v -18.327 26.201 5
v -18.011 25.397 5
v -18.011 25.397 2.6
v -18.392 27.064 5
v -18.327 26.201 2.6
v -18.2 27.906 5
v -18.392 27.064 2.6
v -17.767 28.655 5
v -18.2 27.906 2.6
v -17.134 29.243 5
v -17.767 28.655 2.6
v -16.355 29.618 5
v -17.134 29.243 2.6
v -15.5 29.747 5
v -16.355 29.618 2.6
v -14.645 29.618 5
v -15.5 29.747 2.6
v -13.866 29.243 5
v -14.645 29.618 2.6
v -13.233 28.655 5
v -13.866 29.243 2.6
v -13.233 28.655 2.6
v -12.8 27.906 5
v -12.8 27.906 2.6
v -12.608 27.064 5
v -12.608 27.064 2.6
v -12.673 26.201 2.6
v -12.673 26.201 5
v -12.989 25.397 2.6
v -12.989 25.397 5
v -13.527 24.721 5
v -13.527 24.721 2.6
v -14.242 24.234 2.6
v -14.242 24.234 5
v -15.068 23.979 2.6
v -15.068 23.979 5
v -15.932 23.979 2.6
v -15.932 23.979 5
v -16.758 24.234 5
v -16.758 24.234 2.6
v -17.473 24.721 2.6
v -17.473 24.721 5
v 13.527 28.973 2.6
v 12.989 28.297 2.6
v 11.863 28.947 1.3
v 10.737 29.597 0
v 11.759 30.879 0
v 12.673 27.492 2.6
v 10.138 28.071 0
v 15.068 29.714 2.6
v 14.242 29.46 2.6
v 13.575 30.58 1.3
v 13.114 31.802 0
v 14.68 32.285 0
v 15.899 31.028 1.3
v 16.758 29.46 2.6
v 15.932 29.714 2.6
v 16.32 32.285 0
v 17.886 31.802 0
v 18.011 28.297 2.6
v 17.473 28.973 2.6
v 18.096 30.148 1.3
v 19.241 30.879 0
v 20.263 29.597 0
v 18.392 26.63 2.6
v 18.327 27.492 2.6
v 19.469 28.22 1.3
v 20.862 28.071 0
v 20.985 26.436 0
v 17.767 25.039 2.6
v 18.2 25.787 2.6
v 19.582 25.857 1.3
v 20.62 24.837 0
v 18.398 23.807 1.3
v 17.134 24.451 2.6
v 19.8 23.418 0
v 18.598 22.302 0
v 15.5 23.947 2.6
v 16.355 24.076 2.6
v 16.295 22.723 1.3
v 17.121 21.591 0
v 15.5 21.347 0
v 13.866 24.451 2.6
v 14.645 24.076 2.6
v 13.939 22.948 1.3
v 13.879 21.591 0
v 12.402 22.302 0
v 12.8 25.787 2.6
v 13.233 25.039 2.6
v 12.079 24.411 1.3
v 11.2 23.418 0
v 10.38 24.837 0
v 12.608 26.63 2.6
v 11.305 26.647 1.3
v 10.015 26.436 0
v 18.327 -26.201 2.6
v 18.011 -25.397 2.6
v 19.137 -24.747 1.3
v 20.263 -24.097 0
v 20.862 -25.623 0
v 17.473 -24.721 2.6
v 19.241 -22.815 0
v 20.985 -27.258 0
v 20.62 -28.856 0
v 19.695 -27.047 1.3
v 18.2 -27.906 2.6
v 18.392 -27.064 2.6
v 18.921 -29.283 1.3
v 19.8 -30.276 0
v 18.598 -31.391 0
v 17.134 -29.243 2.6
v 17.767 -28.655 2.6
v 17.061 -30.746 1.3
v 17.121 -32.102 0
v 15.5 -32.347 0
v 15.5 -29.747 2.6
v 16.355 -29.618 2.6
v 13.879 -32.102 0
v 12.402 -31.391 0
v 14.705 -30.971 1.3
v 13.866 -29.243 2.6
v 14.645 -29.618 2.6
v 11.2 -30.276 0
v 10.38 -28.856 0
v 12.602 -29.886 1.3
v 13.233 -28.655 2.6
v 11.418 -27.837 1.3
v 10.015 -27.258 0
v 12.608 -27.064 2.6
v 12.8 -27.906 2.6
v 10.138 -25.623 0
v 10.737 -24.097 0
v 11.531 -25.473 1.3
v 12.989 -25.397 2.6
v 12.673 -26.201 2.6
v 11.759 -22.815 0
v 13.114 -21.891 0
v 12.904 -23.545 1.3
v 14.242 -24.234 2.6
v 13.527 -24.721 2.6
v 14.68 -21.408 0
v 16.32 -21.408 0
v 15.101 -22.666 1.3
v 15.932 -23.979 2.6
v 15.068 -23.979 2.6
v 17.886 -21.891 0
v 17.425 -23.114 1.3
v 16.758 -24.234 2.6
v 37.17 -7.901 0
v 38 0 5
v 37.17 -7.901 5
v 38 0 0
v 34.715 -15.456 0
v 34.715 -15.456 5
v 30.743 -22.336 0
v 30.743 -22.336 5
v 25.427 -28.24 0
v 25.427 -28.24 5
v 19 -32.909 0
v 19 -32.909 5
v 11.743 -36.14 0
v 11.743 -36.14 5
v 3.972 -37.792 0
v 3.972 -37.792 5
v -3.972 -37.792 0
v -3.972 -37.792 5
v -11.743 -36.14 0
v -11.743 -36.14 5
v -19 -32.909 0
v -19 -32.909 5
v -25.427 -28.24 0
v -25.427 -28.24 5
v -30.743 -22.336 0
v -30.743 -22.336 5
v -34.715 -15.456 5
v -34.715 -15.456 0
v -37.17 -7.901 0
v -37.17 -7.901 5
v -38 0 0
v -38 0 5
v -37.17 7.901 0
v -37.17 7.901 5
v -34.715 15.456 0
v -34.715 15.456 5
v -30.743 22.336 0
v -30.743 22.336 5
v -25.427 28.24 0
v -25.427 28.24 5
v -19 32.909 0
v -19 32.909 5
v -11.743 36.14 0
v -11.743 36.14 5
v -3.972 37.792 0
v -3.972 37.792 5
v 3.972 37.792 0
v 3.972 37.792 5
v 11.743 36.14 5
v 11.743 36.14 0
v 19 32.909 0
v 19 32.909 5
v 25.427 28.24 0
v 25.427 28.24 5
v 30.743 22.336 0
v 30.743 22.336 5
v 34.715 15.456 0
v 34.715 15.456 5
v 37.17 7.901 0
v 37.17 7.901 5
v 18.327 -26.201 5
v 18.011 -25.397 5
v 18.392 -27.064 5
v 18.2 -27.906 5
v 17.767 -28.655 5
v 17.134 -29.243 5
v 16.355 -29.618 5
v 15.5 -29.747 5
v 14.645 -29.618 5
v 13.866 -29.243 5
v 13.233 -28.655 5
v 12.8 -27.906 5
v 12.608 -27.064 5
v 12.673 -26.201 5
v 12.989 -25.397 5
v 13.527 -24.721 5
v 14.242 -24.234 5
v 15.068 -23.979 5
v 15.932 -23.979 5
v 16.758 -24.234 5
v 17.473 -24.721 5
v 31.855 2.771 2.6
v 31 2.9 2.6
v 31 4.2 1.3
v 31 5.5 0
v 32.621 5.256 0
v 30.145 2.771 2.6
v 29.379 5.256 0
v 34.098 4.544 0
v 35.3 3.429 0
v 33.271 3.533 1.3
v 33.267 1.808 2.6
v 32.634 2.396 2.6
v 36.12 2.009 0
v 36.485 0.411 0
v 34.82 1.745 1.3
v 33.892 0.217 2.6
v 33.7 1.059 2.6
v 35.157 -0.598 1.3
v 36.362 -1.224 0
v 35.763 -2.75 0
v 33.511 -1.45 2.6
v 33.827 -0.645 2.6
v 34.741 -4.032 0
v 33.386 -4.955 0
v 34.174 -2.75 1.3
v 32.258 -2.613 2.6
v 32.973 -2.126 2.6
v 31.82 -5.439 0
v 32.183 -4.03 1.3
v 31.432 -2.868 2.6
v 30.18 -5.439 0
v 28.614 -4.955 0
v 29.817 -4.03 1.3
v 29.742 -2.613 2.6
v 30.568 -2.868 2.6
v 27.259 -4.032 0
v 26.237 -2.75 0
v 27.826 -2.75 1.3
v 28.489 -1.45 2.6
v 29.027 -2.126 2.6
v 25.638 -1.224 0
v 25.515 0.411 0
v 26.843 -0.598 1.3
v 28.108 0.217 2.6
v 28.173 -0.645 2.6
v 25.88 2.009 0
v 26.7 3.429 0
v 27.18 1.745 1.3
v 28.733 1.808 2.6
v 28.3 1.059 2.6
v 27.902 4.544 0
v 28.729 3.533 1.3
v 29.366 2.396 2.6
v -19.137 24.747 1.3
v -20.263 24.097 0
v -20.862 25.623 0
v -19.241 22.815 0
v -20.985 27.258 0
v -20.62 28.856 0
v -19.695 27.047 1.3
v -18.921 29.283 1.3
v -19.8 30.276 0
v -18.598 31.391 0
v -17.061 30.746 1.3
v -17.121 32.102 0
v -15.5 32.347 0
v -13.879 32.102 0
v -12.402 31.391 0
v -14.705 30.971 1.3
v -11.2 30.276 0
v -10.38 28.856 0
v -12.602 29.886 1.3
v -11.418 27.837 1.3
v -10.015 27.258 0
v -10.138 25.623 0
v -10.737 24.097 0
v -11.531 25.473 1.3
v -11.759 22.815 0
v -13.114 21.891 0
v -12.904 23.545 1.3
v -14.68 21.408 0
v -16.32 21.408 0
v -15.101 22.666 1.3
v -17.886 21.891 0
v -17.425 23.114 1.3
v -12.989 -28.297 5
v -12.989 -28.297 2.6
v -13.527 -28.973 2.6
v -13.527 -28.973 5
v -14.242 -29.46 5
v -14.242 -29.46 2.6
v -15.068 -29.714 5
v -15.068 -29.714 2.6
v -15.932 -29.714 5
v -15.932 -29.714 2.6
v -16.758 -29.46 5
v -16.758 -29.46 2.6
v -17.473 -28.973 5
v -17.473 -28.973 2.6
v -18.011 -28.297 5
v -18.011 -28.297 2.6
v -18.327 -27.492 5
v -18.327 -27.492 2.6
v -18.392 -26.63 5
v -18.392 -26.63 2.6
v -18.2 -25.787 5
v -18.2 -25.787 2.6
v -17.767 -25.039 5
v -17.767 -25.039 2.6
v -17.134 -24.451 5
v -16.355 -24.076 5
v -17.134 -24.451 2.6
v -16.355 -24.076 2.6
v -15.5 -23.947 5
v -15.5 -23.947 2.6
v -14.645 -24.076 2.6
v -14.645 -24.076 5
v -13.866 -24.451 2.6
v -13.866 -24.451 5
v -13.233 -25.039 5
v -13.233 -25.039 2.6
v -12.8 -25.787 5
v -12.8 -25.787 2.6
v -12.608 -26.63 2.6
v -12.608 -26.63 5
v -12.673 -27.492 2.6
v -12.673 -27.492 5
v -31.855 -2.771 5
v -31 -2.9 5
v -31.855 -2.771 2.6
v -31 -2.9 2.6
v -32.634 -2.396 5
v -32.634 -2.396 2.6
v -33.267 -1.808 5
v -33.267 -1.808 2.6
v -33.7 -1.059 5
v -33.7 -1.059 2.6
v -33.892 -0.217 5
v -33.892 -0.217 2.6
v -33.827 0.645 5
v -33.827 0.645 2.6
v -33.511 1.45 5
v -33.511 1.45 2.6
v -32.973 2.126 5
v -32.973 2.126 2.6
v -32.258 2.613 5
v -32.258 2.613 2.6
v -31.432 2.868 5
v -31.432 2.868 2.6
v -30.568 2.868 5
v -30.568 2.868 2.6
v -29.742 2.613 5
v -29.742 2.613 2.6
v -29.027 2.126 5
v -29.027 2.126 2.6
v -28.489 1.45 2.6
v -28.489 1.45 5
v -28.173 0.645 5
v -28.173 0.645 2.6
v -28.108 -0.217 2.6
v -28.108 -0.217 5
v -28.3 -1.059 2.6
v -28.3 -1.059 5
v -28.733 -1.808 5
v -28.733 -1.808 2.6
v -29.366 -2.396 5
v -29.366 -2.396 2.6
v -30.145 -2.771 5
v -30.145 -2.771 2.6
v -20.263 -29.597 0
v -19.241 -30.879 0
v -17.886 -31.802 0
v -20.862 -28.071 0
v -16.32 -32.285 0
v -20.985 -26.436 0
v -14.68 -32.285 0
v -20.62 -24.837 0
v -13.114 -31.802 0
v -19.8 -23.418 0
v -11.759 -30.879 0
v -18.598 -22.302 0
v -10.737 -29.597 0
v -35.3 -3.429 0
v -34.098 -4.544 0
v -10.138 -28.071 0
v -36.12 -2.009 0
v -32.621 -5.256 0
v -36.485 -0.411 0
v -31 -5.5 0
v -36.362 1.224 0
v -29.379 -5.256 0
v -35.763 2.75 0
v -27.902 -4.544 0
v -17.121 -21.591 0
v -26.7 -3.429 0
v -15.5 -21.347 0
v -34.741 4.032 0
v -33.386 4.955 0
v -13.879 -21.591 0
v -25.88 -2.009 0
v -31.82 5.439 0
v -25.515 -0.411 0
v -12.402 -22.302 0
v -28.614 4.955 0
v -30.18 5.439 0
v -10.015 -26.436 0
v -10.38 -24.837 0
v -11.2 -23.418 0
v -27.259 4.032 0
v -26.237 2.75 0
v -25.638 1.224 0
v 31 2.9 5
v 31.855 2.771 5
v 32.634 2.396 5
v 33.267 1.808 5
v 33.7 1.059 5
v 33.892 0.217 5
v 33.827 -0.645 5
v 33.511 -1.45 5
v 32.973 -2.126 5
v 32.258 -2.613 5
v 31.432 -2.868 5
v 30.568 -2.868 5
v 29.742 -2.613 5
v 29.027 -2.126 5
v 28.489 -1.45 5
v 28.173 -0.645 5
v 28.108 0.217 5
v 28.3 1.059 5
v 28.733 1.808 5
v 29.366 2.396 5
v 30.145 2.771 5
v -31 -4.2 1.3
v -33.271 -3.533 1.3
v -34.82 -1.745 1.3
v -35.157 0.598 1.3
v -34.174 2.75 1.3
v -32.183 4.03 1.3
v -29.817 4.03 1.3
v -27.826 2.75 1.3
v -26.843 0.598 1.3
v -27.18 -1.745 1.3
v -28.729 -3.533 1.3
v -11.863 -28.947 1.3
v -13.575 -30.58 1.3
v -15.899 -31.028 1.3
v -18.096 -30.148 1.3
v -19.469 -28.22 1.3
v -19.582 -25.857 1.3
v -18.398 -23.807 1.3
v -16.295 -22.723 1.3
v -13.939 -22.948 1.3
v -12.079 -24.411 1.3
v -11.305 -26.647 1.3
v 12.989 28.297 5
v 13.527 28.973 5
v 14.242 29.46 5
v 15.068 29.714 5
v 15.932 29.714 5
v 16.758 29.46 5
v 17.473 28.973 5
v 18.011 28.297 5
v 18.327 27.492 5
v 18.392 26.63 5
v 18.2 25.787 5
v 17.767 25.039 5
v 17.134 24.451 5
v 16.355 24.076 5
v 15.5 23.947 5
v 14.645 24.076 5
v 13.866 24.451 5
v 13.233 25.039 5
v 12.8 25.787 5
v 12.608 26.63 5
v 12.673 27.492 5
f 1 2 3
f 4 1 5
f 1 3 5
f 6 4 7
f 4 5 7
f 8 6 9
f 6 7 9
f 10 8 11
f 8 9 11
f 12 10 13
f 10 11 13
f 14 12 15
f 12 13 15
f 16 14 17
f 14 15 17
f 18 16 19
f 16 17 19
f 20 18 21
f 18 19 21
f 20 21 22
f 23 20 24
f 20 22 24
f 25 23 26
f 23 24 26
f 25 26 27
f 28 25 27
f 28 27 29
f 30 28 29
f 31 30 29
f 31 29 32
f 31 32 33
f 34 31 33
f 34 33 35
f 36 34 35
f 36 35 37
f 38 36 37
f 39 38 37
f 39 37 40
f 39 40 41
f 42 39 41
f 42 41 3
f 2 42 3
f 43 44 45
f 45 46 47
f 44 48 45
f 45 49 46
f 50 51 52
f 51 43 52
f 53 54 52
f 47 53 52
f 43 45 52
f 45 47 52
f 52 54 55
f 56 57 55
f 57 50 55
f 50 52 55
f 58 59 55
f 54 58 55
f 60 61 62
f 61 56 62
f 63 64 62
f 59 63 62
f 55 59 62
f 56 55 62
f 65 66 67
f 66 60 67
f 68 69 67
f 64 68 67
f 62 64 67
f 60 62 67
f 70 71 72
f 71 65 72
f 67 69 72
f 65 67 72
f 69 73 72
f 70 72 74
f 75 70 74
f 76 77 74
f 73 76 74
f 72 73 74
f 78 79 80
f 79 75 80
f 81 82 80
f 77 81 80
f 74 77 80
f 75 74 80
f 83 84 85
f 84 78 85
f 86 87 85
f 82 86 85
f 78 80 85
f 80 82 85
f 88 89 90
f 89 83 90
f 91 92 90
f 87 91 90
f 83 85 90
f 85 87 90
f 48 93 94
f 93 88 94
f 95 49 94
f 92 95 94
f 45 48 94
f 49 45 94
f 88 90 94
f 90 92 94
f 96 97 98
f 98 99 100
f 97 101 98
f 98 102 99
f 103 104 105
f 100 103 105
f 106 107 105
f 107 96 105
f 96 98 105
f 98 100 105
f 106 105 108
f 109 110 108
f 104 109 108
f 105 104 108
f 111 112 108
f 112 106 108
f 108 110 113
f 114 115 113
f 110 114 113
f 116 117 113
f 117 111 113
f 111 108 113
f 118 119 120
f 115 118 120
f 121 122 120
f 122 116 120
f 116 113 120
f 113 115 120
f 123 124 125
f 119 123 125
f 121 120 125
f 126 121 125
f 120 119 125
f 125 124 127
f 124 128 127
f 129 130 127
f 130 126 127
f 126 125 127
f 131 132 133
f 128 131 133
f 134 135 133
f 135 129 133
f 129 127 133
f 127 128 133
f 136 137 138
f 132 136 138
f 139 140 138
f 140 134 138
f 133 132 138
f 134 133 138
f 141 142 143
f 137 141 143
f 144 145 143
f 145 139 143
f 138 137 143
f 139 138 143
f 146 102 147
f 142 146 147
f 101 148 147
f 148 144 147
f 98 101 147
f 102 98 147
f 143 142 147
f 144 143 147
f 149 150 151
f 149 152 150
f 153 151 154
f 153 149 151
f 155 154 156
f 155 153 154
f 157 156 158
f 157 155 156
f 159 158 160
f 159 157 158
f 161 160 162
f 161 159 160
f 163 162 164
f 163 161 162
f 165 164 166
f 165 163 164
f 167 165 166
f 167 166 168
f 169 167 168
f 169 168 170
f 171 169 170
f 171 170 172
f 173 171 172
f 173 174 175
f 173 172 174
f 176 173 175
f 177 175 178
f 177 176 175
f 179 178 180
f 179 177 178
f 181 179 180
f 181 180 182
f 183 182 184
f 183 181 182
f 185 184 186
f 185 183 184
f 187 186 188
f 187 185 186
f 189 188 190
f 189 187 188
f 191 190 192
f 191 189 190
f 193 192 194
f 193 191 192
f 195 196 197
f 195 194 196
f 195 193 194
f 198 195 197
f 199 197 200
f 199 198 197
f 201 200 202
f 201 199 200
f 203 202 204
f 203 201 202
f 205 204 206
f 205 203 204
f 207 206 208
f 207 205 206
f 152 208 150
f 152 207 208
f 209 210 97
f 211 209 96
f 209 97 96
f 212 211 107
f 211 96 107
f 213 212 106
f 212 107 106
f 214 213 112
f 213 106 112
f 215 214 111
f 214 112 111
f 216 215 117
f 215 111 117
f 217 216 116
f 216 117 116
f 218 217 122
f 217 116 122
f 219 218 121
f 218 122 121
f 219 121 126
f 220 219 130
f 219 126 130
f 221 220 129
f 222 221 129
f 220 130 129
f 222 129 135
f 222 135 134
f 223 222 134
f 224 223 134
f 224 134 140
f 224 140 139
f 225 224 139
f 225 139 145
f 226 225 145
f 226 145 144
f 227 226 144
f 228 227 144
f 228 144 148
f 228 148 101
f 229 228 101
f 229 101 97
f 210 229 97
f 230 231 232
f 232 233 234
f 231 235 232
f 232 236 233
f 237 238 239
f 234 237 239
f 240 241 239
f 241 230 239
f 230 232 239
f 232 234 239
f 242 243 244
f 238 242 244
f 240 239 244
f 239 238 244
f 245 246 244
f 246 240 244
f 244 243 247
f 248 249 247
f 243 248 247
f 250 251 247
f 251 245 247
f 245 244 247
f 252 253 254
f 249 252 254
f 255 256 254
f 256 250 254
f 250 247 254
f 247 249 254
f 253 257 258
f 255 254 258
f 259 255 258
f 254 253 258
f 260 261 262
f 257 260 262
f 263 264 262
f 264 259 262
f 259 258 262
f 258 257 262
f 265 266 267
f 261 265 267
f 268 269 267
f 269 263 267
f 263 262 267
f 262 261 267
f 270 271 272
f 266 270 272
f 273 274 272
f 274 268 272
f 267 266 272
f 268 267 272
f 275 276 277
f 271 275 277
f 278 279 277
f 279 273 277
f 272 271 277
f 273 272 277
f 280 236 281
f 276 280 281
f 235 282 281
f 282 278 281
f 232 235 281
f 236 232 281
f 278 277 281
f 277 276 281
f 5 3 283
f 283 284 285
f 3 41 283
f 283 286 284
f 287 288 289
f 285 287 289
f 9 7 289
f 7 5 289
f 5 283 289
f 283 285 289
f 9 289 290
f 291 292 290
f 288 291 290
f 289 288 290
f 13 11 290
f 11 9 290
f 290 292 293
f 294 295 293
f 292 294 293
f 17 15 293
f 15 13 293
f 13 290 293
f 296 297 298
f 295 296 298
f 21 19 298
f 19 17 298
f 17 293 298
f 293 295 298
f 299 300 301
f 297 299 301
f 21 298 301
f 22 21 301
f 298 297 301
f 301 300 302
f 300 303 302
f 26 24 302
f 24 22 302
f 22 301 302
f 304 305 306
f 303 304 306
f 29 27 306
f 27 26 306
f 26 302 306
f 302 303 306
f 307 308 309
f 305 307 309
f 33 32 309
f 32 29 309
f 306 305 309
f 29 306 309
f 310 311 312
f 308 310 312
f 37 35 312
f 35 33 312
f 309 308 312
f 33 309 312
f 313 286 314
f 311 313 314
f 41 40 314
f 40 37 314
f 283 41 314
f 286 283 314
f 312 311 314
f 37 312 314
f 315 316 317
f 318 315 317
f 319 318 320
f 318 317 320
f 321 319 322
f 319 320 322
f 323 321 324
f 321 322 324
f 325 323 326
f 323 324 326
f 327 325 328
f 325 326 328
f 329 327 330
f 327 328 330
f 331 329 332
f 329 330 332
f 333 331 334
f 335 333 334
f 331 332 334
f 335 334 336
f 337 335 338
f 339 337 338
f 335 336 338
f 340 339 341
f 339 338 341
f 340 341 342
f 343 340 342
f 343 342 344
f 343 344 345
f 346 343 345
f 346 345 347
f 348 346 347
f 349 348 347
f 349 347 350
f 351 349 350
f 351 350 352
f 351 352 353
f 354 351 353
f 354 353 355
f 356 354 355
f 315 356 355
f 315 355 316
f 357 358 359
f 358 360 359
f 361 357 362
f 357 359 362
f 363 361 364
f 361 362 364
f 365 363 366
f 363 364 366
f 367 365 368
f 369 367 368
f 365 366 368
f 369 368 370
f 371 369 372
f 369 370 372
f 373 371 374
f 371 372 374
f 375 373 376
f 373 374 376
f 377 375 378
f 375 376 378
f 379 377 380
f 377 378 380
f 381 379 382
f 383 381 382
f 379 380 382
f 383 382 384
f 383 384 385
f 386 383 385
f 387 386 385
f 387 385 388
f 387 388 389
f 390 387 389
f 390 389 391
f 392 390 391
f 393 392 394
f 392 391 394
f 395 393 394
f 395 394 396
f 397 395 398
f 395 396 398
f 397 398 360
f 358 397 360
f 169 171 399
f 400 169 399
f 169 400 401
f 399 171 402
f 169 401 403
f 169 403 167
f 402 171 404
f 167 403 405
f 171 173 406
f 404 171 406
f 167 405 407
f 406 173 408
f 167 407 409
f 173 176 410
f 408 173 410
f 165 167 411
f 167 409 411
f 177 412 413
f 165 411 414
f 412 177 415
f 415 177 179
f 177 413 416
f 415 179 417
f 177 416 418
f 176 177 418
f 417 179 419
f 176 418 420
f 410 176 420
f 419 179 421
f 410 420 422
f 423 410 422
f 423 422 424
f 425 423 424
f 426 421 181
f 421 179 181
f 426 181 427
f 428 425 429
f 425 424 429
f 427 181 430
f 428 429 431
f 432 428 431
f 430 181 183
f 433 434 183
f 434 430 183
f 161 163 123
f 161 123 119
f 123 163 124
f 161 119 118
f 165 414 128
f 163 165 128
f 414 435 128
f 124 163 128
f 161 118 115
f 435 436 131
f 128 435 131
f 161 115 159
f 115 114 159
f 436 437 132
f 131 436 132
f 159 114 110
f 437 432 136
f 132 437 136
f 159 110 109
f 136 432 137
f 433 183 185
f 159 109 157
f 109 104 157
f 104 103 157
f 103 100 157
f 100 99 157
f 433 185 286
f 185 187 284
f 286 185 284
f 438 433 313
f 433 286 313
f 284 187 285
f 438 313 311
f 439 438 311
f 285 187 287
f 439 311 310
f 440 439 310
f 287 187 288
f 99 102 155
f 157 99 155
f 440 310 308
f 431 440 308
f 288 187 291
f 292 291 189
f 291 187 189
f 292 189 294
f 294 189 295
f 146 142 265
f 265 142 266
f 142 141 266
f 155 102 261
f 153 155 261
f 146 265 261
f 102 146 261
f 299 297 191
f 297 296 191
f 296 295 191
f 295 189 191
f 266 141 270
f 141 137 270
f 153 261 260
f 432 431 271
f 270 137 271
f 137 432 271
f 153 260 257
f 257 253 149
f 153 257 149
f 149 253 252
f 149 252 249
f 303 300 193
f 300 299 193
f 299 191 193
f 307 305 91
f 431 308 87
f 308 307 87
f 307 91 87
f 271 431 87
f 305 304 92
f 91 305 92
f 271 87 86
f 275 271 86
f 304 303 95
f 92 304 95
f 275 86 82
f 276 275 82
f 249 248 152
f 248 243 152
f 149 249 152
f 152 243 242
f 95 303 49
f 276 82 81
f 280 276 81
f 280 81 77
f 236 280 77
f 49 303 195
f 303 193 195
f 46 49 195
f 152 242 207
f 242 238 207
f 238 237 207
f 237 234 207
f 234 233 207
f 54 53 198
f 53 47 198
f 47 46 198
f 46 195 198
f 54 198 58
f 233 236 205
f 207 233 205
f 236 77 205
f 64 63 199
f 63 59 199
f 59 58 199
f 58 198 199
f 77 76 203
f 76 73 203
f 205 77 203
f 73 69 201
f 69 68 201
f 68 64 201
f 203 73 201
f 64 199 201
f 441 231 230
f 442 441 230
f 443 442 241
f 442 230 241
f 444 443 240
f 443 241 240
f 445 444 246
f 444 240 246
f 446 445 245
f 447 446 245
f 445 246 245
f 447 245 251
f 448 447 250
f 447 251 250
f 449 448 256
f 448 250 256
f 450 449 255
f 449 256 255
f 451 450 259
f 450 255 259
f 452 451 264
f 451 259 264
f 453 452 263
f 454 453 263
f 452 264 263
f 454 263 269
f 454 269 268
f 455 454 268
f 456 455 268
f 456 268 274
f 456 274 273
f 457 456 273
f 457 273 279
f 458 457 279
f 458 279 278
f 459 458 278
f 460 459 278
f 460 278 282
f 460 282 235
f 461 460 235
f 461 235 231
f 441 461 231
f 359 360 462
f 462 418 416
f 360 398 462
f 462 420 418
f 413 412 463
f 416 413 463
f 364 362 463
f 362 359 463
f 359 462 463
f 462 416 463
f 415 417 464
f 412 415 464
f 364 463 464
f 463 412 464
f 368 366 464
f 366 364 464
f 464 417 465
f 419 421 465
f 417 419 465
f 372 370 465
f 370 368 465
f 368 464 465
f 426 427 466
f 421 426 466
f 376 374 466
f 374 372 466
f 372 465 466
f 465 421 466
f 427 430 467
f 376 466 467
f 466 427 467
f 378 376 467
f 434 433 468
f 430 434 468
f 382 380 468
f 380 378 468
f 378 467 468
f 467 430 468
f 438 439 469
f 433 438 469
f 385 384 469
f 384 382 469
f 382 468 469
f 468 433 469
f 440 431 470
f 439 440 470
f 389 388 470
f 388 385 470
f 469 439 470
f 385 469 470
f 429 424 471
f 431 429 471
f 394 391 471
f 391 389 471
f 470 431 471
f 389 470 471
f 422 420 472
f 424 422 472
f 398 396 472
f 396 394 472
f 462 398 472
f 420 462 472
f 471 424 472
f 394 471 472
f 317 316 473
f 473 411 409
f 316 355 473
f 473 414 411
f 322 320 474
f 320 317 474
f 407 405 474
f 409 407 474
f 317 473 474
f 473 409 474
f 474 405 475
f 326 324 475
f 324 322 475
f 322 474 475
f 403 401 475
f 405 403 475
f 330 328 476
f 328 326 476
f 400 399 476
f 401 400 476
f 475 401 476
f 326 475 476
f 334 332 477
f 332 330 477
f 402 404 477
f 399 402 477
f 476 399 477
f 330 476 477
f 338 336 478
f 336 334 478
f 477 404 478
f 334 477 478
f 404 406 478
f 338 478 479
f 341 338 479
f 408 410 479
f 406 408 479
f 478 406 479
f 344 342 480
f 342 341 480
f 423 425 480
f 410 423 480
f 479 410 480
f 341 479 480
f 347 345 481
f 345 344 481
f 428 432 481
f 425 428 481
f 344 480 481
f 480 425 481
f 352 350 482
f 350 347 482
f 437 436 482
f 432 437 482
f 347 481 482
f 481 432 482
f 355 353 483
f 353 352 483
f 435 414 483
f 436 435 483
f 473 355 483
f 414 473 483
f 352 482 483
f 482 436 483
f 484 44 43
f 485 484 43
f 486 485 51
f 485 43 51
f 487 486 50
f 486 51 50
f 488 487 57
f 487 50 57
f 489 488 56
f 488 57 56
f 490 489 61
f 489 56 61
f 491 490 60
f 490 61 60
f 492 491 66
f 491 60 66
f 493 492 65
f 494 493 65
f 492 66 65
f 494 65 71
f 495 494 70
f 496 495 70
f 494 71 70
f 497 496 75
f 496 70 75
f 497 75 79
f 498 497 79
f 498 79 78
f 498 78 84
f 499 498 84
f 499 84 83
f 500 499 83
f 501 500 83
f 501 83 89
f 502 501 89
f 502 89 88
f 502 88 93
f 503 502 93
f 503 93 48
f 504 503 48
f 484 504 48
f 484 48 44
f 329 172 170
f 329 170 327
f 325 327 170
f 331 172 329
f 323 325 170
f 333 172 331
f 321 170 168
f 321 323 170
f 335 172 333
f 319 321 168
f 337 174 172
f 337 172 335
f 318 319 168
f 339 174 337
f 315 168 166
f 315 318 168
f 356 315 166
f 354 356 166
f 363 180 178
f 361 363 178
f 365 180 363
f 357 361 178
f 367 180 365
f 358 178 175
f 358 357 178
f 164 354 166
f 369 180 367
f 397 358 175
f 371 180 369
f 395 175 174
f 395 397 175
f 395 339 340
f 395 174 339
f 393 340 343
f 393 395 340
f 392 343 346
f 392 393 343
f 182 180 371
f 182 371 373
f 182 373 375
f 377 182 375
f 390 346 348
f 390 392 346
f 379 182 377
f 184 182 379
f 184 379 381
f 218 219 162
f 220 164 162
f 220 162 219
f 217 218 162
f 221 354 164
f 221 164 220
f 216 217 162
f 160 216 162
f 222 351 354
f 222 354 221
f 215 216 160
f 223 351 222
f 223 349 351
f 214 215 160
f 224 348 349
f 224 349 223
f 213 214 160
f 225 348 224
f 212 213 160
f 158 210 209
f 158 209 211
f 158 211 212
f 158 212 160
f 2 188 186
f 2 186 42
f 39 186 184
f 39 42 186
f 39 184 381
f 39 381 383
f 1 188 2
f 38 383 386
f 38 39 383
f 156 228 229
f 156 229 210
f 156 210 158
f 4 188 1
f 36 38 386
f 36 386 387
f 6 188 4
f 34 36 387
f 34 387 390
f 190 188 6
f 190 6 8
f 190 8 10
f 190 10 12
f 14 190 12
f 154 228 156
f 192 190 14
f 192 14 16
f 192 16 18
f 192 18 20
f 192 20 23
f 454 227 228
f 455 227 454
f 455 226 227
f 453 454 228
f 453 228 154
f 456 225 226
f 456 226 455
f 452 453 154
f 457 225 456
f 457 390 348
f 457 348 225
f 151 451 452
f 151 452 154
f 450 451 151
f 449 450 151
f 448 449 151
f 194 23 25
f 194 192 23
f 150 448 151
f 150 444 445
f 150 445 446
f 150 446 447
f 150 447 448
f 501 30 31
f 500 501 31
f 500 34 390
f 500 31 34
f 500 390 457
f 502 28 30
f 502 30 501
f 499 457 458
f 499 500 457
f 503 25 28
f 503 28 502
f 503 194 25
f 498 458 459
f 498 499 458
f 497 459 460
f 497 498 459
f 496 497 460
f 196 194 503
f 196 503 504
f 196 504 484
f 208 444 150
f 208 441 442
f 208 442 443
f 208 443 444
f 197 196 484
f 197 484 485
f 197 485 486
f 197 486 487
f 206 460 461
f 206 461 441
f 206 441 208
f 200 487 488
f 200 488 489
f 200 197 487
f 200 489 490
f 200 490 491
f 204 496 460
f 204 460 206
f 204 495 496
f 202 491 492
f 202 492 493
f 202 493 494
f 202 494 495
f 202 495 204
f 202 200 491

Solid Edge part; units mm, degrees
sketch "Sketch1" plane through (0, 0, 0) normal (0, 0, 1) x (1, 0, 0)
  circle A0 centre (0, 0) radius 38
extrude "Protrusion1" add sketch "Sketch1" along normal blind 5
hole "Hole_1" at (31, 0, 0) direction (0, 0, 1) diameter 5.8 end up to next countersink diameter 11 countersink angle 90
pattern_circular "Pattern1" count 6 over 360 about axis through (0, 0, 0) along (0, 0, 1) of "Hole_1"
properties material "Steel"
